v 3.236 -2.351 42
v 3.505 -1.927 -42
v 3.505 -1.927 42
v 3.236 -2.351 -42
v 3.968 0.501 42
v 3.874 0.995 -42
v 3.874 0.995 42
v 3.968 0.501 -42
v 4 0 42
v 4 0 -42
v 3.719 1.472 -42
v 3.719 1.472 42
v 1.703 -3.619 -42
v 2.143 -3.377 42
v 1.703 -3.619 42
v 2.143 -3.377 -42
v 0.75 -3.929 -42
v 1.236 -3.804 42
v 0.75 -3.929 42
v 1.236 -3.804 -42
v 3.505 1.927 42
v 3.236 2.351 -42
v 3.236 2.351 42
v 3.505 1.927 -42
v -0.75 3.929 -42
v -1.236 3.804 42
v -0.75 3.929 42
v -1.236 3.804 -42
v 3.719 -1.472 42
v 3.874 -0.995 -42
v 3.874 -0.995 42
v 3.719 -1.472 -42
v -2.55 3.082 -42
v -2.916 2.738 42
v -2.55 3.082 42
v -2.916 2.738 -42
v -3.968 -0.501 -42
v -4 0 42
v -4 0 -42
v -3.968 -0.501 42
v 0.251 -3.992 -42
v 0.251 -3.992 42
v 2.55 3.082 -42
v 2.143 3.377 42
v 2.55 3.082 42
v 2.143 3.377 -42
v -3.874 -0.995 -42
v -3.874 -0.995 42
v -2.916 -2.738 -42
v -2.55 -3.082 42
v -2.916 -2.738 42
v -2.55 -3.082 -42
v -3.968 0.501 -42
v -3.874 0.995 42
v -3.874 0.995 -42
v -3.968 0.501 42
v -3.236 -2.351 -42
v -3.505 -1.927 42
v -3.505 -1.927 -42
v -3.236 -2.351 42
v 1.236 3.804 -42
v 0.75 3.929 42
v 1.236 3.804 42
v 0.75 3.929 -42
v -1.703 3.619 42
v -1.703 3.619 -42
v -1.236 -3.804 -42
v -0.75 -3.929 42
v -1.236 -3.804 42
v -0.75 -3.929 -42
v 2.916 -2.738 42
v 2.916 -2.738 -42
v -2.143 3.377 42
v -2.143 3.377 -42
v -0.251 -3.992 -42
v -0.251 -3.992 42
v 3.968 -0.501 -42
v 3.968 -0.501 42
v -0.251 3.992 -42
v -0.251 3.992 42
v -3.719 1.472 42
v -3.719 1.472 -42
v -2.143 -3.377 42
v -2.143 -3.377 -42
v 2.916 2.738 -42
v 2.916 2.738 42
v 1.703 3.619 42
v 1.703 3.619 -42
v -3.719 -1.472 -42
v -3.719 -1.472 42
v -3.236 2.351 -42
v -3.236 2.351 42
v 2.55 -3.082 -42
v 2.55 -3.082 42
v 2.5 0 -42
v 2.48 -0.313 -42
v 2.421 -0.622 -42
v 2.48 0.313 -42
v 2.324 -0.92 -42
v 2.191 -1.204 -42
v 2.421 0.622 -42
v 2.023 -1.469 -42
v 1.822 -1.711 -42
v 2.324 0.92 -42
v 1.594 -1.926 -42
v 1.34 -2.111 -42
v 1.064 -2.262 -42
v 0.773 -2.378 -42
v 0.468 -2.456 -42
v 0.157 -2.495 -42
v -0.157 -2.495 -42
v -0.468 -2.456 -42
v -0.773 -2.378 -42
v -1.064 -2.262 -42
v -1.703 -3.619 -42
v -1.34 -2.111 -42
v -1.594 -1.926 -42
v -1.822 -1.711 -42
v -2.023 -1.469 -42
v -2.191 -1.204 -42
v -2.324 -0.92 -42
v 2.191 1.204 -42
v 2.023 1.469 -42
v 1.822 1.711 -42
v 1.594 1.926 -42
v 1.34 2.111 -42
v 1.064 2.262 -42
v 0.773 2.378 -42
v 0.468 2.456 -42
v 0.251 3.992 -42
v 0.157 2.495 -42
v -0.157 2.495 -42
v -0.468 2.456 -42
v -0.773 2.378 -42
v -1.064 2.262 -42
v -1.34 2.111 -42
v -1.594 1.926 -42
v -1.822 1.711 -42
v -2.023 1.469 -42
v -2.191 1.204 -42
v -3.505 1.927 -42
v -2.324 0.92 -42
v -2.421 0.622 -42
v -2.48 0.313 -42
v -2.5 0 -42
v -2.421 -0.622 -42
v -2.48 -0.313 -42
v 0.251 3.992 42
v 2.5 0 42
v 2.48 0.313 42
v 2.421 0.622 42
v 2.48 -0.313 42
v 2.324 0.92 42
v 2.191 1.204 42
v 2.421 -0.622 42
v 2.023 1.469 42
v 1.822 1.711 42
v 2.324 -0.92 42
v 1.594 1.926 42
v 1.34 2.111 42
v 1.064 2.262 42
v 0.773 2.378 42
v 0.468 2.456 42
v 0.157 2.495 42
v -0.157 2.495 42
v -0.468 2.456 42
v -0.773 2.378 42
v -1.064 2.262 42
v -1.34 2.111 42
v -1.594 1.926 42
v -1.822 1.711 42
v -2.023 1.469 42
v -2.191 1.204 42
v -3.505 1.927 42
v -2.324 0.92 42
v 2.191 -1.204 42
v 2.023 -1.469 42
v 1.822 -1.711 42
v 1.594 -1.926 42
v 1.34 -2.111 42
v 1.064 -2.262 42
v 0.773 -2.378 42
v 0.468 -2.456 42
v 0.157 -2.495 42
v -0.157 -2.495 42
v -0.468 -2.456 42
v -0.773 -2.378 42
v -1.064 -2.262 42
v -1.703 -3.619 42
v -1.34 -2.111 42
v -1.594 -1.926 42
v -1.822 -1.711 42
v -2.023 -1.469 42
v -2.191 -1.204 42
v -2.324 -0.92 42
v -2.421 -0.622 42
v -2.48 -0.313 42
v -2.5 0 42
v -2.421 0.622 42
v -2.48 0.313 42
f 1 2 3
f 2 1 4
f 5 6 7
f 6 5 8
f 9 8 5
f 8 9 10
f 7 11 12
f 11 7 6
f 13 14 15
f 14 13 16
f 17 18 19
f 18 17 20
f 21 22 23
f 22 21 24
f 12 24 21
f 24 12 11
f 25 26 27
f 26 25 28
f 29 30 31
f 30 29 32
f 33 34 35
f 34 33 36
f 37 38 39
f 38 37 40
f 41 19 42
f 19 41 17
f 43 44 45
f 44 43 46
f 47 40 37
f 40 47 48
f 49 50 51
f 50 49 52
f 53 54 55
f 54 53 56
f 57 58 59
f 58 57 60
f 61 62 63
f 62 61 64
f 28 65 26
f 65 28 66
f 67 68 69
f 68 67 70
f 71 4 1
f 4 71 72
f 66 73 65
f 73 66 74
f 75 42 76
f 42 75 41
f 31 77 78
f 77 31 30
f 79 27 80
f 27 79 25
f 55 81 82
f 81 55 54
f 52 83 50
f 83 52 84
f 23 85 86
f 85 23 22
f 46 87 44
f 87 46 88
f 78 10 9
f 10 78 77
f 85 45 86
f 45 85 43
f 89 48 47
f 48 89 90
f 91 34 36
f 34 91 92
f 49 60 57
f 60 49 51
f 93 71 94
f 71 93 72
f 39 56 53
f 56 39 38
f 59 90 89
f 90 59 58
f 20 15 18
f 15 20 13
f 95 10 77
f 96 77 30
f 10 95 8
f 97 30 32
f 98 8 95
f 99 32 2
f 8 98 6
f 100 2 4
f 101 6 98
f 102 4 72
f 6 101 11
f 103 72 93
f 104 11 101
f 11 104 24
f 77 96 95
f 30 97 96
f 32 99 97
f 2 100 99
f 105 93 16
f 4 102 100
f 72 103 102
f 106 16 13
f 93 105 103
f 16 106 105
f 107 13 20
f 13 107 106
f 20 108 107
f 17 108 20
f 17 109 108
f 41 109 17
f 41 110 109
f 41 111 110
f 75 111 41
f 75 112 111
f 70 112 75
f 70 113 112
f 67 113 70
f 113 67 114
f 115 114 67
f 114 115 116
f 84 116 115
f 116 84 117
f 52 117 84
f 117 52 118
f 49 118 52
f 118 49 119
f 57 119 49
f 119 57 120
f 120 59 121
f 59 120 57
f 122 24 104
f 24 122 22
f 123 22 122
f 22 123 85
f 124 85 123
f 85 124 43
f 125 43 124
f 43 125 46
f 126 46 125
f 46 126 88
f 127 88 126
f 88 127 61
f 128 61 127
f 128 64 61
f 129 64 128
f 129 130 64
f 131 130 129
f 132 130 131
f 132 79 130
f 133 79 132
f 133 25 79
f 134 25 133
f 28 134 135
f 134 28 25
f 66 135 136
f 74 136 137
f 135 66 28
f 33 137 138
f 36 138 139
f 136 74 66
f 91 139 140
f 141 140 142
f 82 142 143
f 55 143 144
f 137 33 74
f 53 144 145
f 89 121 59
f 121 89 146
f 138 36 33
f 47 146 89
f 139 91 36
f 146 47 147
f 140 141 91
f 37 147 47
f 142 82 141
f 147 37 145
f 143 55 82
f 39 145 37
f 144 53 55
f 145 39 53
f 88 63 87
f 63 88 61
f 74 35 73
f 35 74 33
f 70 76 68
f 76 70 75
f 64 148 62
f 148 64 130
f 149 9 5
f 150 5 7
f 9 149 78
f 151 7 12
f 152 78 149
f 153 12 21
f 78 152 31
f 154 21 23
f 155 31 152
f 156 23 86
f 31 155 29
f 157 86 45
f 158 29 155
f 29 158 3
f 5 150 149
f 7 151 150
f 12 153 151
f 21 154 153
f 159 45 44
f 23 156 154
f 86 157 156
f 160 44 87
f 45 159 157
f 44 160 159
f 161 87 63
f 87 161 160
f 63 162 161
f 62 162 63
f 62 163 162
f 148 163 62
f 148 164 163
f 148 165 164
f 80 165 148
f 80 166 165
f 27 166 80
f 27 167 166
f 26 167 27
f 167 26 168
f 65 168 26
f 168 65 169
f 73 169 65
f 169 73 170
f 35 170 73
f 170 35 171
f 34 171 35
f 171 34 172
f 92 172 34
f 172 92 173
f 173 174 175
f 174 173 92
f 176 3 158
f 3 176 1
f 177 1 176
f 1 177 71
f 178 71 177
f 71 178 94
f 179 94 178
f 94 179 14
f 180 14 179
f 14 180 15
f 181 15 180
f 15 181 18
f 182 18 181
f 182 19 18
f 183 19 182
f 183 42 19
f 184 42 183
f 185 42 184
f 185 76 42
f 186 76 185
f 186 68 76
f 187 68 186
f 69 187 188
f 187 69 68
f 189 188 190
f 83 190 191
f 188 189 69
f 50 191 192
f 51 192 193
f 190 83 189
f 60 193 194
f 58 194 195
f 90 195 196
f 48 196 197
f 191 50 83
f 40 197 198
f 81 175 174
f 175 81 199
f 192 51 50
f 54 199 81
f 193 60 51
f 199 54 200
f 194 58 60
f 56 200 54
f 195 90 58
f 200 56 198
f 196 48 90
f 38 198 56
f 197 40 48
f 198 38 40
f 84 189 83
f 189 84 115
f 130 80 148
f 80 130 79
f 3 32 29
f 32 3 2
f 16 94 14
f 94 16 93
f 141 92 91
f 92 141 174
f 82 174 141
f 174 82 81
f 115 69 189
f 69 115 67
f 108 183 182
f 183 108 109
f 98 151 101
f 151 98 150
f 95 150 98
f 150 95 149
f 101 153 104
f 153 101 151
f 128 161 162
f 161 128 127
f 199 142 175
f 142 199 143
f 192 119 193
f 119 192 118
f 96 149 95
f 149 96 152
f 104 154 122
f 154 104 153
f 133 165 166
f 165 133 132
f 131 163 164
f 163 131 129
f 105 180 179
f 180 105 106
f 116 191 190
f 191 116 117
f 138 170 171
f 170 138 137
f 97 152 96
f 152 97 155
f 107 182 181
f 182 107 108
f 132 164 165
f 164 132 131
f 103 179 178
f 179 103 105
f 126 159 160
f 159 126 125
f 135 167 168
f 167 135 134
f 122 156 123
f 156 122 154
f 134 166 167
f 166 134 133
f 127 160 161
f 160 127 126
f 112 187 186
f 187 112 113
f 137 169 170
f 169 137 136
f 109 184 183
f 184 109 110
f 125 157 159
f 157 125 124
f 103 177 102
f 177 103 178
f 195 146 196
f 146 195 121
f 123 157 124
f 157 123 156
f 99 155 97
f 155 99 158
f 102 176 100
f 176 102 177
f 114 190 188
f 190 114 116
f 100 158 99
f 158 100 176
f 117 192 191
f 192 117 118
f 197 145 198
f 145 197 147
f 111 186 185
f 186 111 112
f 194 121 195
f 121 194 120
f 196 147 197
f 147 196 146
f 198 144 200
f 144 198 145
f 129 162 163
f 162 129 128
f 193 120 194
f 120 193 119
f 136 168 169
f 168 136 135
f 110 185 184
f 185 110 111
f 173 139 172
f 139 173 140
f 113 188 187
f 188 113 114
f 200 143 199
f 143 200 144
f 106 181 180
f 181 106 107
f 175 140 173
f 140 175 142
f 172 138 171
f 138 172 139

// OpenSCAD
$fn = 50;


difference() {
	union() {
		translate(v = [0, 0, -42.0000000000]) {
			cylinder(h = 84, r = 4.0000000000);
		}
	}
	union() {
		translate(v = [0, 0, -100.0000000000]) {
			cylinder(h = 200, r = 2.5000000000);
		}
	}
}
